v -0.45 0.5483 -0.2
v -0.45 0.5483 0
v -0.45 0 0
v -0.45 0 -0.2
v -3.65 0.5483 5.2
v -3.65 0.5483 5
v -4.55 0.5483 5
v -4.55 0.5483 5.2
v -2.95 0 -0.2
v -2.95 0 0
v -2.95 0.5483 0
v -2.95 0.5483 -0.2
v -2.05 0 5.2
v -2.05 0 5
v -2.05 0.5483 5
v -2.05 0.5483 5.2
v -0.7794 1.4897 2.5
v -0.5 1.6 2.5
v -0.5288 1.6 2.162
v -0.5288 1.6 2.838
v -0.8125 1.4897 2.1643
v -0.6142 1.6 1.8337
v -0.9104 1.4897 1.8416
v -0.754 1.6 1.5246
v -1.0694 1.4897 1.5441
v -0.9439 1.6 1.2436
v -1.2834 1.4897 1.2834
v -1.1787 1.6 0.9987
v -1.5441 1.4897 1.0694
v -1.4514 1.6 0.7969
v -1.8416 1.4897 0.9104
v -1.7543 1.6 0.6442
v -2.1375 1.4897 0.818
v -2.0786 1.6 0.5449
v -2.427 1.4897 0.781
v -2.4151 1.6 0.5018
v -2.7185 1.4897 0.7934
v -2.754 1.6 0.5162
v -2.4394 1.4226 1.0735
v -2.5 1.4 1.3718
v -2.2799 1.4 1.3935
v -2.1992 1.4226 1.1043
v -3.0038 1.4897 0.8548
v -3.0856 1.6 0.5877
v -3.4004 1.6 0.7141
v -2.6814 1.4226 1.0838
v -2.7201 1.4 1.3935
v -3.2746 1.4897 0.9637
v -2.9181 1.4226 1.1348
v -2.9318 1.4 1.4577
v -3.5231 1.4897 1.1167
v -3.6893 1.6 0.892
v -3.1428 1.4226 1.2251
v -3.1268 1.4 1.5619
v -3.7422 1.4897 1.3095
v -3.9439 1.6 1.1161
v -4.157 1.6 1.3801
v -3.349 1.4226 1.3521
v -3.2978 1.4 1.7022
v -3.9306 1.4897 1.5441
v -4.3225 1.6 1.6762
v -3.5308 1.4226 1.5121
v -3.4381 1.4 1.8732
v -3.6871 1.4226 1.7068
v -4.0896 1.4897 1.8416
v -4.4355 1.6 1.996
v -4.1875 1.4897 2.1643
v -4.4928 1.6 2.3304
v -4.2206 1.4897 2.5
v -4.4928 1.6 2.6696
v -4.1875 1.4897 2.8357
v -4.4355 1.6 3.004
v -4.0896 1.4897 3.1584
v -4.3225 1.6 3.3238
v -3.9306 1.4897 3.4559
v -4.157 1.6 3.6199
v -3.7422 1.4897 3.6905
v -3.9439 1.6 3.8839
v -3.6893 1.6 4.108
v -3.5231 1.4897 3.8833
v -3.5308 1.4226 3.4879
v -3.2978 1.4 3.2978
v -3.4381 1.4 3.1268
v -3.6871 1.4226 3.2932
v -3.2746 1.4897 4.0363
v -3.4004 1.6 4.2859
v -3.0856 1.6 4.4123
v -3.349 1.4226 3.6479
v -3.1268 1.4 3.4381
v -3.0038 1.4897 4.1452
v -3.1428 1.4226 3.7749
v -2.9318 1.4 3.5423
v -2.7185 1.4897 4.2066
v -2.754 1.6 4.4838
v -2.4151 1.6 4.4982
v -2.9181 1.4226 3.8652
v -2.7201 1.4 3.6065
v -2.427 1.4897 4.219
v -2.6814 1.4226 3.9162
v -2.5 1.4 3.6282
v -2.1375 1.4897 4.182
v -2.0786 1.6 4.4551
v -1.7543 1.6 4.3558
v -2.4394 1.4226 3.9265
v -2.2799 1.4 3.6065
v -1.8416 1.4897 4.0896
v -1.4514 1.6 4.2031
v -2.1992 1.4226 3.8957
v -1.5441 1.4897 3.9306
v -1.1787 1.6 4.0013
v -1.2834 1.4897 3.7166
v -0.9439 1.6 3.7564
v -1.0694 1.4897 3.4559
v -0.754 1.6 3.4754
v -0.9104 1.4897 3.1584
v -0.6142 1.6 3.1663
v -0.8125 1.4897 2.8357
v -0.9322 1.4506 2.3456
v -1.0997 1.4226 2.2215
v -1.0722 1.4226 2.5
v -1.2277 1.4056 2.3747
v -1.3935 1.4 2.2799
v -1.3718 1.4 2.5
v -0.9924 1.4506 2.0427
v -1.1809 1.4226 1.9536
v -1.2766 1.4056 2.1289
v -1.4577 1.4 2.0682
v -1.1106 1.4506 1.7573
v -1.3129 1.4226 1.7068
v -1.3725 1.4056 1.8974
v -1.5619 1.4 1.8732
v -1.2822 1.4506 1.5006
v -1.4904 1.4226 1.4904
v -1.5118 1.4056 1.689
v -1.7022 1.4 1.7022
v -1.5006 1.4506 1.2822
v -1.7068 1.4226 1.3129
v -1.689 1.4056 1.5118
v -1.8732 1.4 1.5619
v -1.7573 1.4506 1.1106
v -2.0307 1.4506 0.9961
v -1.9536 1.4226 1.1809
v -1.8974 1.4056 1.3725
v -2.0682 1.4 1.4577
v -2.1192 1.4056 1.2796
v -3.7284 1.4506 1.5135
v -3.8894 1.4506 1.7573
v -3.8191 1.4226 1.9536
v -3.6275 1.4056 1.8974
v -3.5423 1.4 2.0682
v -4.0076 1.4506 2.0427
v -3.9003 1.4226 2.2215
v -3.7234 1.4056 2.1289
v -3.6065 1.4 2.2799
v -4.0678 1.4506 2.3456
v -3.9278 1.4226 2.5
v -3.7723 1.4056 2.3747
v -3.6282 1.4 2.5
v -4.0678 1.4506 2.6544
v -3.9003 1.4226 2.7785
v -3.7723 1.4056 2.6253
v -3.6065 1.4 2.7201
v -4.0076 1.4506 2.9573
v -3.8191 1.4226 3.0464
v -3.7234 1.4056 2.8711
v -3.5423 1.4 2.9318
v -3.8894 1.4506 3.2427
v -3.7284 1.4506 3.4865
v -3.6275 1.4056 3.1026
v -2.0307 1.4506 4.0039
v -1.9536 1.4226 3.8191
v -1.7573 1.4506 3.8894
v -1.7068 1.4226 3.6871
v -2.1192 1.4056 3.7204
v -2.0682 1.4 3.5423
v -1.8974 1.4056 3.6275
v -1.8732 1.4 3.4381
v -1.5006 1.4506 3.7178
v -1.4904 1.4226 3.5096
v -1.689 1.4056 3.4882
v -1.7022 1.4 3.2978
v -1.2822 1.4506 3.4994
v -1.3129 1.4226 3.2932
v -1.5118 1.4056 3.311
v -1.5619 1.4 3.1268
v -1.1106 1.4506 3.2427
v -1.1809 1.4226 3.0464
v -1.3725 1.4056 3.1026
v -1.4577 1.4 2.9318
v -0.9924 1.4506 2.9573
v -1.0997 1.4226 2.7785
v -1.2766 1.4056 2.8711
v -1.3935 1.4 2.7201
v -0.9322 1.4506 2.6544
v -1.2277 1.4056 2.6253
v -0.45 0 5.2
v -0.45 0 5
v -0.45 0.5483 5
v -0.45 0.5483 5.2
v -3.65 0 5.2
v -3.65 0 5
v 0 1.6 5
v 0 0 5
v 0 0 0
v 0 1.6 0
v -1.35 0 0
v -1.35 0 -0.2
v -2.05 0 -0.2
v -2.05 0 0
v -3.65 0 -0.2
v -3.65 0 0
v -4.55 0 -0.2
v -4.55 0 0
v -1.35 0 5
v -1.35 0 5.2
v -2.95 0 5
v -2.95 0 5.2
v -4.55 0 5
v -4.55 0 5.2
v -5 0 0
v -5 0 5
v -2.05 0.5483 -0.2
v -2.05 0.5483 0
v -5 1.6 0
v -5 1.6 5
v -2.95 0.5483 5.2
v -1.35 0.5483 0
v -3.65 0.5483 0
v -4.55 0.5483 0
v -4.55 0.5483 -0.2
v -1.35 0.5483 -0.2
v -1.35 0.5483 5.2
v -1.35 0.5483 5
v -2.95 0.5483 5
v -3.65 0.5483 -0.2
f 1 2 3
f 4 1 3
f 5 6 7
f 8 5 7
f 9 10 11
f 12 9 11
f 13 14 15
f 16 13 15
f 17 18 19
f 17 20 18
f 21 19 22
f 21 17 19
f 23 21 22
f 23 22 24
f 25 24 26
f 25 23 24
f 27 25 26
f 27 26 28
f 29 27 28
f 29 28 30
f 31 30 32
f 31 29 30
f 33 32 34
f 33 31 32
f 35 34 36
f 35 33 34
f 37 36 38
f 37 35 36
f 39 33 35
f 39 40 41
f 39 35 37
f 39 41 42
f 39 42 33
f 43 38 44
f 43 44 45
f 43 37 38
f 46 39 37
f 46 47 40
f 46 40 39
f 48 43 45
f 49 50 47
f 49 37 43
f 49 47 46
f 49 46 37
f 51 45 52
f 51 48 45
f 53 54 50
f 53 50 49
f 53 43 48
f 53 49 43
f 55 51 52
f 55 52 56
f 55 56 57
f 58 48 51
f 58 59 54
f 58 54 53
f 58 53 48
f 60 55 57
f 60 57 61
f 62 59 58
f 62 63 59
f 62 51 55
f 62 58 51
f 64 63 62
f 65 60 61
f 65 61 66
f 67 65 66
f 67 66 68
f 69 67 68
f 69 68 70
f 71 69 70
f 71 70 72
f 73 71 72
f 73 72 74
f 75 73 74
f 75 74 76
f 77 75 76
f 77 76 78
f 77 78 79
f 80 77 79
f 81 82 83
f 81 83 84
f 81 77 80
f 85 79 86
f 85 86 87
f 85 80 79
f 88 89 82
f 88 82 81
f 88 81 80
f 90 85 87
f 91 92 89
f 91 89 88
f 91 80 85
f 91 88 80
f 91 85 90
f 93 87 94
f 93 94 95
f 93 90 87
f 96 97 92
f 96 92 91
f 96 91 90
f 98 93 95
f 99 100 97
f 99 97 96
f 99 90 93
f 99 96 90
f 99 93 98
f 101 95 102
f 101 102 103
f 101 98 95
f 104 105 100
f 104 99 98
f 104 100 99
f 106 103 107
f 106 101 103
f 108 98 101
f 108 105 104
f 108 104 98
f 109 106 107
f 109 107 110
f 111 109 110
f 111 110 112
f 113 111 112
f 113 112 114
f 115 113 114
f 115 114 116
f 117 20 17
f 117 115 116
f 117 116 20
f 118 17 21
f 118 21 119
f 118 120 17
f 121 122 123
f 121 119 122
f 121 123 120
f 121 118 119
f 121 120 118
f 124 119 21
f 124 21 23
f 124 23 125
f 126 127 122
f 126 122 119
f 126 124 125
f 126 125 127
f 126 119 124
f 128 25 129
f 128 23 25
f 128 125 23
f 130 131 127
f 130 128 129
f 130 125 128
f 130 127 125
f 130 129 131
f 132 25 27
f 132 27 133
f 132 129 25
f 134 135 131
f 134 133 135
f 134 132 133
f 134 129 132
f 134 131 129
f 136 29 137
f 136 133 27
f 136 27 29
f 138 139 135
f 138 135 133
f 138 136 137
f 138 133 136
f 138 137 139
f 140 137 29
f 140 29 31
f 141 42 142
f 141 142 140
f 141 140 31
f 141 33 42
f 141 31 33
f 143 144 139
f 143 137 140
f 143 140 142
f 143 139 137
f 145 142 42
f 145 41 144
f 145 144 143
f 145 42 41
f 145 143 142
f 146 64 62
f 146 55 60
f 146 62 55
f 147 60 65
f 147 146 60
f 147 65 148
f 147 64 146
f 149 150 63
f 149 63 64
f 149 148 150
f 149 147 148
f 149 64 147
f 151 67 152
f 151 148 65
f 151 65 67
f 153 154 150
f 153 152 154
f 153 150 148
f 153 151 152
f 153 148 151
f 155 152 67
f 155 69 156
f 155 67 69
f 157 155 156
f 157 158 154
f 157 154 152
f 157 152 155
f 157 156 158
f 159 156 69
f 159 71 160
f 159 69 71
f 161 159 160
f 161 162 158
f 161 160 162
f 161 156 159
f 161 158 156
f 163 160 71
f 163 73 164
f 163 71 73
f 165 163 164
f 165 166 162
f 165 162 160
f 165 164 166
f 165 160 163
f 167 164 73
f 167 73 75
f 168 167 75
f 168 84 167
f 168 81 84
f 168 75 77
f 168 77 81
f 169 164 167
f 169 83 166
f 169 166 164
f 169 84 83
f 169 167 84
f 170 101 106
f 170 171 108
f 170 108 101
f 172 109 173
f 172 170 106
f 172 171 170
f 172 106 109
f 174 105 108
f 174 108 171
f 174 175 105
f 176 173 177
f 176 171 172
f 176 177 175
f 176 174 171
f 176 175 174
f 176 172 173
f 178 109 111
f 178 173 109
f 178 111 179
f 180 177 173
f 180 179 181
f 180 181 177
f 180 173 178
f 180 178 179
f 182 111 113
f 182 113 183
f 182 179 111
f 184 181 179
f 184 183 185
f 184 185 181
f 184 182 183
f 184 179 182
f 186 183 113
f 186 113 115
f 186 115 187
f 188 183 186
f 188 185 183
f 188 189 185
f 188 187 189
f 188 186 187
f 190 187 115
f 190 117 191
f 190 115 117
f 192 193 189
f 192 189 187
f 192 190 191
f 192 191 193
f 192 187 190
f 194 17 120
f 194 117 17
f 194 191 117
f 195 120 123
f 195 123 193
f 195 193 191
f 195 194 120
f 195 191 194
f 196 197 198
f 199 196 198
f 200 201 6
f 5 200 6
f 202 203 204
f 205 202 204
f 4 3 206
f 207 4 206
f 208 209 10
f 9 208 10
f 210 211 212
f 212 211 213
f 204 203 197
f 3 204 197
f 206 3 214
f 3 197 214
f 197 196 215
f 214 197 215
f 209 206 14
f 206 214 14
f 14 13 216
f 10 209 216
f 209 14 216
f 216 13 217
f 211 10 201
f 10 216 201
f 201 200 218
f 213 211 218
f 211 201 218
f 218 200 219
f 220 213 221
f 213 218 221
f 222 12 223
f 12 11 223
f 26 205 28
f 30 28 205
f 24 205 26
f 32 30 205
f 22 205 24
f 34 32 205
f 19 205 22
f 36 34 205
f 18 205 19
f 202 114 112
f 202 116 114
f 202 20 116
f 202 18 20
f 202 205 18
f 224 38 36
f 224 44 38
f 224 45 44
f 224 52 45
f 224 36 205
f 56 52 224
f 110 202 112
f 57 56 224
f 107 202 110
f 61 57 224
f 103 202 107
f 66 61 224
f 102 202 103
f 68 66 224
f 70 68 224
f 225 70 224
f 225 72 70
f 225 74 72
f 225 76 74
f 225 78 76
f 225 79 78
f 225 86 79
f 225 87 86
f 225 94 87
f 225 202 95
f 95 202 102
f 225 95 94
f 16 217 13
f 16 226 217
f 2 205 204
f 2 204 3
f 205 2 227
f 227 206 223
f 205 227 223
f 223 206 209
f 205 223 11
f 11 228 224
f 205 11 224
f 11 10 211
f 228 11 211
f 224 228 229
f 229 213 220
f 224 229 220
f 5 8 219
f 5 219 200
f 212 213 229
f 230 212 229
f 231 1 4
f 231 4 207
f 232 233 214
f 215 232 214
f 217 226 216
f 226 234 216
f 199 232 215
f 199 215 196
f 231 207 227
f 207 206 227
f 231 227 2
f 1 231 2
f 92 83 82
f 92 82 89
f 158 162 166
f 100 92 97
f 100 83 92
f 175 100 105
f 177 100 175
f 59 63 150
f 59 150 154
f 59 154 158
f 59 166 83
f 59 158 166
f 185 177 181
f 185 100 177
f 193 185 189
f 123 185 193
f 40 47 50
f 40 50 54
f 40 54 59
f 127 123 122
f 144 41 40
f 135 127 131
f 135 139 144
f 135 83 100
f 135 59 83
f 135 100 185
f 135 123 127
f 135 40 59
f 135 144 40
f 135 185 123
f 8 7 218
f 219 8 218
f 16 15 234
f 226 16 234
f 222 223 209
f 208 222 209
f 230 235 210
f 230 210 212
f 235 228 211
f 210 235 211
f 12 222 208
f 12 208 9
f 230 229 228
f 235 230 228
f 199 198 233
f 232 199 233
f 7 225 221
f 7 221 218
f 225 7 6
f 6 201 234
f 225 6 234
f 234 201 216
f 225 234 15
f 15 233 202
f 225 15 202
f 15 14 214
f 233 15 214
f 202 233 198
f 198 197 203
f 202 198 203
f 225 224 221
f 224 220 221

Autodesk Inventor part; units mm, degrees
ref_plane "YZ Plane" through (0, 0, 0) normal (1, 0, 0) x (0, 1, 0)
ref_plane "XZ Plane" through (0, 0, 0) normal (0, 1, 0) x (-1, 0, 0)
ref_plane "XY Plane" through (0, 0, 0) normal (0, 0, 1) x (1, 0, 0)
sketch "Skizze1" plane through (0, 0, 0) normal (0, 1, 0) x (-1, 0, 0)
  line L0 (0, 0) -> (5, 0)
  line L1 (5, 0) -> (5, 5)
  line L2 (5, 5) -> (0, 5)
  line L3 (0, 5) -> (0, 0)
  dimension "d0" = 5
  dimension "d1" = 5
extrude "Extrusion1" add sketch "Skizze1" along normal blind 1.6
ref_plane "Arbeitsebene1" through (0, 1.6, 2.5) normal (0, 0, -1) x (-1, 0, 0)
sketch "Skizze2" plane through (-5, 0, 5) normal (0, 0, 1) x (1, 0, 0)
  line L0 (0, 0) -> (5, 0) projected
  line L1 (5, 0) -> (5, 1.6) projected
  line L2 (0, 0) -> (0, 1.6) projected
  line L3 (0.45, 0) -> (1.35, 0)
  line L4 (1.35, 0) -> (1.35, 0.5483)
  line L5 (1.35, 0.5483) -> (0.45, 0.5483)
  line L6 (0.45, 0.5483) -> (0.45, 0)
  line L7 (2.05, 0) -> (2.95, 0)
  line L8 (2.95, 0) -> (2.95, 0.5483)
  line L9 (2.95, 0.5483) -> (2.05, 0.5483)
  line L10 (2.05, 0.5483) -> (2.05, 0)
  line L11 (3.65, 0) -> (4.55, 0)
  line L12 (4.55, 0) -> (4.55, 0.5483)
  line L13 (4.55, 0.5483) -> (3.65, 0.5483)
  line L14 (3.65, 0.5483) -> (3.65, 0)
  line L15 (0.45, 0.5483) -> (0, 0.5483)
  line L16 (4.55, 0.5483) -> (5, 0.5483)
  dimension "d4" = 0.9
  dimension "d5" = 0.9
  dimension "d6" = 0.9
  dimension "d7" = 0.7
  dimension "d8" = 0.7
extrude "Extrusion2" add sketch "Skizze2" along normal blind 0.2 contours L6 L5 L4 L0 | L10 L9 L8 L0 | L14 L13 L12 L0
mirror "Spiegeln1" about plane through (0, 1.6, 2.5) normal (0, 0, -1) of "Extrusion2"
sketch "Skizze3" plane through (0, 1.6, 0) normal (0, 1, 0) x (1, 0, 0)
  circle A0 centre (-2.5, -2.5) radius 2
  dimension "d11" = 4
extrude "Extrusion3" cut sketch "Skizze3" against normal blind 0.2
fillet "Rundung1" radius 2 1 edges at (-4.5, 1.4, 2.5)
properties part number "5050_LED"
